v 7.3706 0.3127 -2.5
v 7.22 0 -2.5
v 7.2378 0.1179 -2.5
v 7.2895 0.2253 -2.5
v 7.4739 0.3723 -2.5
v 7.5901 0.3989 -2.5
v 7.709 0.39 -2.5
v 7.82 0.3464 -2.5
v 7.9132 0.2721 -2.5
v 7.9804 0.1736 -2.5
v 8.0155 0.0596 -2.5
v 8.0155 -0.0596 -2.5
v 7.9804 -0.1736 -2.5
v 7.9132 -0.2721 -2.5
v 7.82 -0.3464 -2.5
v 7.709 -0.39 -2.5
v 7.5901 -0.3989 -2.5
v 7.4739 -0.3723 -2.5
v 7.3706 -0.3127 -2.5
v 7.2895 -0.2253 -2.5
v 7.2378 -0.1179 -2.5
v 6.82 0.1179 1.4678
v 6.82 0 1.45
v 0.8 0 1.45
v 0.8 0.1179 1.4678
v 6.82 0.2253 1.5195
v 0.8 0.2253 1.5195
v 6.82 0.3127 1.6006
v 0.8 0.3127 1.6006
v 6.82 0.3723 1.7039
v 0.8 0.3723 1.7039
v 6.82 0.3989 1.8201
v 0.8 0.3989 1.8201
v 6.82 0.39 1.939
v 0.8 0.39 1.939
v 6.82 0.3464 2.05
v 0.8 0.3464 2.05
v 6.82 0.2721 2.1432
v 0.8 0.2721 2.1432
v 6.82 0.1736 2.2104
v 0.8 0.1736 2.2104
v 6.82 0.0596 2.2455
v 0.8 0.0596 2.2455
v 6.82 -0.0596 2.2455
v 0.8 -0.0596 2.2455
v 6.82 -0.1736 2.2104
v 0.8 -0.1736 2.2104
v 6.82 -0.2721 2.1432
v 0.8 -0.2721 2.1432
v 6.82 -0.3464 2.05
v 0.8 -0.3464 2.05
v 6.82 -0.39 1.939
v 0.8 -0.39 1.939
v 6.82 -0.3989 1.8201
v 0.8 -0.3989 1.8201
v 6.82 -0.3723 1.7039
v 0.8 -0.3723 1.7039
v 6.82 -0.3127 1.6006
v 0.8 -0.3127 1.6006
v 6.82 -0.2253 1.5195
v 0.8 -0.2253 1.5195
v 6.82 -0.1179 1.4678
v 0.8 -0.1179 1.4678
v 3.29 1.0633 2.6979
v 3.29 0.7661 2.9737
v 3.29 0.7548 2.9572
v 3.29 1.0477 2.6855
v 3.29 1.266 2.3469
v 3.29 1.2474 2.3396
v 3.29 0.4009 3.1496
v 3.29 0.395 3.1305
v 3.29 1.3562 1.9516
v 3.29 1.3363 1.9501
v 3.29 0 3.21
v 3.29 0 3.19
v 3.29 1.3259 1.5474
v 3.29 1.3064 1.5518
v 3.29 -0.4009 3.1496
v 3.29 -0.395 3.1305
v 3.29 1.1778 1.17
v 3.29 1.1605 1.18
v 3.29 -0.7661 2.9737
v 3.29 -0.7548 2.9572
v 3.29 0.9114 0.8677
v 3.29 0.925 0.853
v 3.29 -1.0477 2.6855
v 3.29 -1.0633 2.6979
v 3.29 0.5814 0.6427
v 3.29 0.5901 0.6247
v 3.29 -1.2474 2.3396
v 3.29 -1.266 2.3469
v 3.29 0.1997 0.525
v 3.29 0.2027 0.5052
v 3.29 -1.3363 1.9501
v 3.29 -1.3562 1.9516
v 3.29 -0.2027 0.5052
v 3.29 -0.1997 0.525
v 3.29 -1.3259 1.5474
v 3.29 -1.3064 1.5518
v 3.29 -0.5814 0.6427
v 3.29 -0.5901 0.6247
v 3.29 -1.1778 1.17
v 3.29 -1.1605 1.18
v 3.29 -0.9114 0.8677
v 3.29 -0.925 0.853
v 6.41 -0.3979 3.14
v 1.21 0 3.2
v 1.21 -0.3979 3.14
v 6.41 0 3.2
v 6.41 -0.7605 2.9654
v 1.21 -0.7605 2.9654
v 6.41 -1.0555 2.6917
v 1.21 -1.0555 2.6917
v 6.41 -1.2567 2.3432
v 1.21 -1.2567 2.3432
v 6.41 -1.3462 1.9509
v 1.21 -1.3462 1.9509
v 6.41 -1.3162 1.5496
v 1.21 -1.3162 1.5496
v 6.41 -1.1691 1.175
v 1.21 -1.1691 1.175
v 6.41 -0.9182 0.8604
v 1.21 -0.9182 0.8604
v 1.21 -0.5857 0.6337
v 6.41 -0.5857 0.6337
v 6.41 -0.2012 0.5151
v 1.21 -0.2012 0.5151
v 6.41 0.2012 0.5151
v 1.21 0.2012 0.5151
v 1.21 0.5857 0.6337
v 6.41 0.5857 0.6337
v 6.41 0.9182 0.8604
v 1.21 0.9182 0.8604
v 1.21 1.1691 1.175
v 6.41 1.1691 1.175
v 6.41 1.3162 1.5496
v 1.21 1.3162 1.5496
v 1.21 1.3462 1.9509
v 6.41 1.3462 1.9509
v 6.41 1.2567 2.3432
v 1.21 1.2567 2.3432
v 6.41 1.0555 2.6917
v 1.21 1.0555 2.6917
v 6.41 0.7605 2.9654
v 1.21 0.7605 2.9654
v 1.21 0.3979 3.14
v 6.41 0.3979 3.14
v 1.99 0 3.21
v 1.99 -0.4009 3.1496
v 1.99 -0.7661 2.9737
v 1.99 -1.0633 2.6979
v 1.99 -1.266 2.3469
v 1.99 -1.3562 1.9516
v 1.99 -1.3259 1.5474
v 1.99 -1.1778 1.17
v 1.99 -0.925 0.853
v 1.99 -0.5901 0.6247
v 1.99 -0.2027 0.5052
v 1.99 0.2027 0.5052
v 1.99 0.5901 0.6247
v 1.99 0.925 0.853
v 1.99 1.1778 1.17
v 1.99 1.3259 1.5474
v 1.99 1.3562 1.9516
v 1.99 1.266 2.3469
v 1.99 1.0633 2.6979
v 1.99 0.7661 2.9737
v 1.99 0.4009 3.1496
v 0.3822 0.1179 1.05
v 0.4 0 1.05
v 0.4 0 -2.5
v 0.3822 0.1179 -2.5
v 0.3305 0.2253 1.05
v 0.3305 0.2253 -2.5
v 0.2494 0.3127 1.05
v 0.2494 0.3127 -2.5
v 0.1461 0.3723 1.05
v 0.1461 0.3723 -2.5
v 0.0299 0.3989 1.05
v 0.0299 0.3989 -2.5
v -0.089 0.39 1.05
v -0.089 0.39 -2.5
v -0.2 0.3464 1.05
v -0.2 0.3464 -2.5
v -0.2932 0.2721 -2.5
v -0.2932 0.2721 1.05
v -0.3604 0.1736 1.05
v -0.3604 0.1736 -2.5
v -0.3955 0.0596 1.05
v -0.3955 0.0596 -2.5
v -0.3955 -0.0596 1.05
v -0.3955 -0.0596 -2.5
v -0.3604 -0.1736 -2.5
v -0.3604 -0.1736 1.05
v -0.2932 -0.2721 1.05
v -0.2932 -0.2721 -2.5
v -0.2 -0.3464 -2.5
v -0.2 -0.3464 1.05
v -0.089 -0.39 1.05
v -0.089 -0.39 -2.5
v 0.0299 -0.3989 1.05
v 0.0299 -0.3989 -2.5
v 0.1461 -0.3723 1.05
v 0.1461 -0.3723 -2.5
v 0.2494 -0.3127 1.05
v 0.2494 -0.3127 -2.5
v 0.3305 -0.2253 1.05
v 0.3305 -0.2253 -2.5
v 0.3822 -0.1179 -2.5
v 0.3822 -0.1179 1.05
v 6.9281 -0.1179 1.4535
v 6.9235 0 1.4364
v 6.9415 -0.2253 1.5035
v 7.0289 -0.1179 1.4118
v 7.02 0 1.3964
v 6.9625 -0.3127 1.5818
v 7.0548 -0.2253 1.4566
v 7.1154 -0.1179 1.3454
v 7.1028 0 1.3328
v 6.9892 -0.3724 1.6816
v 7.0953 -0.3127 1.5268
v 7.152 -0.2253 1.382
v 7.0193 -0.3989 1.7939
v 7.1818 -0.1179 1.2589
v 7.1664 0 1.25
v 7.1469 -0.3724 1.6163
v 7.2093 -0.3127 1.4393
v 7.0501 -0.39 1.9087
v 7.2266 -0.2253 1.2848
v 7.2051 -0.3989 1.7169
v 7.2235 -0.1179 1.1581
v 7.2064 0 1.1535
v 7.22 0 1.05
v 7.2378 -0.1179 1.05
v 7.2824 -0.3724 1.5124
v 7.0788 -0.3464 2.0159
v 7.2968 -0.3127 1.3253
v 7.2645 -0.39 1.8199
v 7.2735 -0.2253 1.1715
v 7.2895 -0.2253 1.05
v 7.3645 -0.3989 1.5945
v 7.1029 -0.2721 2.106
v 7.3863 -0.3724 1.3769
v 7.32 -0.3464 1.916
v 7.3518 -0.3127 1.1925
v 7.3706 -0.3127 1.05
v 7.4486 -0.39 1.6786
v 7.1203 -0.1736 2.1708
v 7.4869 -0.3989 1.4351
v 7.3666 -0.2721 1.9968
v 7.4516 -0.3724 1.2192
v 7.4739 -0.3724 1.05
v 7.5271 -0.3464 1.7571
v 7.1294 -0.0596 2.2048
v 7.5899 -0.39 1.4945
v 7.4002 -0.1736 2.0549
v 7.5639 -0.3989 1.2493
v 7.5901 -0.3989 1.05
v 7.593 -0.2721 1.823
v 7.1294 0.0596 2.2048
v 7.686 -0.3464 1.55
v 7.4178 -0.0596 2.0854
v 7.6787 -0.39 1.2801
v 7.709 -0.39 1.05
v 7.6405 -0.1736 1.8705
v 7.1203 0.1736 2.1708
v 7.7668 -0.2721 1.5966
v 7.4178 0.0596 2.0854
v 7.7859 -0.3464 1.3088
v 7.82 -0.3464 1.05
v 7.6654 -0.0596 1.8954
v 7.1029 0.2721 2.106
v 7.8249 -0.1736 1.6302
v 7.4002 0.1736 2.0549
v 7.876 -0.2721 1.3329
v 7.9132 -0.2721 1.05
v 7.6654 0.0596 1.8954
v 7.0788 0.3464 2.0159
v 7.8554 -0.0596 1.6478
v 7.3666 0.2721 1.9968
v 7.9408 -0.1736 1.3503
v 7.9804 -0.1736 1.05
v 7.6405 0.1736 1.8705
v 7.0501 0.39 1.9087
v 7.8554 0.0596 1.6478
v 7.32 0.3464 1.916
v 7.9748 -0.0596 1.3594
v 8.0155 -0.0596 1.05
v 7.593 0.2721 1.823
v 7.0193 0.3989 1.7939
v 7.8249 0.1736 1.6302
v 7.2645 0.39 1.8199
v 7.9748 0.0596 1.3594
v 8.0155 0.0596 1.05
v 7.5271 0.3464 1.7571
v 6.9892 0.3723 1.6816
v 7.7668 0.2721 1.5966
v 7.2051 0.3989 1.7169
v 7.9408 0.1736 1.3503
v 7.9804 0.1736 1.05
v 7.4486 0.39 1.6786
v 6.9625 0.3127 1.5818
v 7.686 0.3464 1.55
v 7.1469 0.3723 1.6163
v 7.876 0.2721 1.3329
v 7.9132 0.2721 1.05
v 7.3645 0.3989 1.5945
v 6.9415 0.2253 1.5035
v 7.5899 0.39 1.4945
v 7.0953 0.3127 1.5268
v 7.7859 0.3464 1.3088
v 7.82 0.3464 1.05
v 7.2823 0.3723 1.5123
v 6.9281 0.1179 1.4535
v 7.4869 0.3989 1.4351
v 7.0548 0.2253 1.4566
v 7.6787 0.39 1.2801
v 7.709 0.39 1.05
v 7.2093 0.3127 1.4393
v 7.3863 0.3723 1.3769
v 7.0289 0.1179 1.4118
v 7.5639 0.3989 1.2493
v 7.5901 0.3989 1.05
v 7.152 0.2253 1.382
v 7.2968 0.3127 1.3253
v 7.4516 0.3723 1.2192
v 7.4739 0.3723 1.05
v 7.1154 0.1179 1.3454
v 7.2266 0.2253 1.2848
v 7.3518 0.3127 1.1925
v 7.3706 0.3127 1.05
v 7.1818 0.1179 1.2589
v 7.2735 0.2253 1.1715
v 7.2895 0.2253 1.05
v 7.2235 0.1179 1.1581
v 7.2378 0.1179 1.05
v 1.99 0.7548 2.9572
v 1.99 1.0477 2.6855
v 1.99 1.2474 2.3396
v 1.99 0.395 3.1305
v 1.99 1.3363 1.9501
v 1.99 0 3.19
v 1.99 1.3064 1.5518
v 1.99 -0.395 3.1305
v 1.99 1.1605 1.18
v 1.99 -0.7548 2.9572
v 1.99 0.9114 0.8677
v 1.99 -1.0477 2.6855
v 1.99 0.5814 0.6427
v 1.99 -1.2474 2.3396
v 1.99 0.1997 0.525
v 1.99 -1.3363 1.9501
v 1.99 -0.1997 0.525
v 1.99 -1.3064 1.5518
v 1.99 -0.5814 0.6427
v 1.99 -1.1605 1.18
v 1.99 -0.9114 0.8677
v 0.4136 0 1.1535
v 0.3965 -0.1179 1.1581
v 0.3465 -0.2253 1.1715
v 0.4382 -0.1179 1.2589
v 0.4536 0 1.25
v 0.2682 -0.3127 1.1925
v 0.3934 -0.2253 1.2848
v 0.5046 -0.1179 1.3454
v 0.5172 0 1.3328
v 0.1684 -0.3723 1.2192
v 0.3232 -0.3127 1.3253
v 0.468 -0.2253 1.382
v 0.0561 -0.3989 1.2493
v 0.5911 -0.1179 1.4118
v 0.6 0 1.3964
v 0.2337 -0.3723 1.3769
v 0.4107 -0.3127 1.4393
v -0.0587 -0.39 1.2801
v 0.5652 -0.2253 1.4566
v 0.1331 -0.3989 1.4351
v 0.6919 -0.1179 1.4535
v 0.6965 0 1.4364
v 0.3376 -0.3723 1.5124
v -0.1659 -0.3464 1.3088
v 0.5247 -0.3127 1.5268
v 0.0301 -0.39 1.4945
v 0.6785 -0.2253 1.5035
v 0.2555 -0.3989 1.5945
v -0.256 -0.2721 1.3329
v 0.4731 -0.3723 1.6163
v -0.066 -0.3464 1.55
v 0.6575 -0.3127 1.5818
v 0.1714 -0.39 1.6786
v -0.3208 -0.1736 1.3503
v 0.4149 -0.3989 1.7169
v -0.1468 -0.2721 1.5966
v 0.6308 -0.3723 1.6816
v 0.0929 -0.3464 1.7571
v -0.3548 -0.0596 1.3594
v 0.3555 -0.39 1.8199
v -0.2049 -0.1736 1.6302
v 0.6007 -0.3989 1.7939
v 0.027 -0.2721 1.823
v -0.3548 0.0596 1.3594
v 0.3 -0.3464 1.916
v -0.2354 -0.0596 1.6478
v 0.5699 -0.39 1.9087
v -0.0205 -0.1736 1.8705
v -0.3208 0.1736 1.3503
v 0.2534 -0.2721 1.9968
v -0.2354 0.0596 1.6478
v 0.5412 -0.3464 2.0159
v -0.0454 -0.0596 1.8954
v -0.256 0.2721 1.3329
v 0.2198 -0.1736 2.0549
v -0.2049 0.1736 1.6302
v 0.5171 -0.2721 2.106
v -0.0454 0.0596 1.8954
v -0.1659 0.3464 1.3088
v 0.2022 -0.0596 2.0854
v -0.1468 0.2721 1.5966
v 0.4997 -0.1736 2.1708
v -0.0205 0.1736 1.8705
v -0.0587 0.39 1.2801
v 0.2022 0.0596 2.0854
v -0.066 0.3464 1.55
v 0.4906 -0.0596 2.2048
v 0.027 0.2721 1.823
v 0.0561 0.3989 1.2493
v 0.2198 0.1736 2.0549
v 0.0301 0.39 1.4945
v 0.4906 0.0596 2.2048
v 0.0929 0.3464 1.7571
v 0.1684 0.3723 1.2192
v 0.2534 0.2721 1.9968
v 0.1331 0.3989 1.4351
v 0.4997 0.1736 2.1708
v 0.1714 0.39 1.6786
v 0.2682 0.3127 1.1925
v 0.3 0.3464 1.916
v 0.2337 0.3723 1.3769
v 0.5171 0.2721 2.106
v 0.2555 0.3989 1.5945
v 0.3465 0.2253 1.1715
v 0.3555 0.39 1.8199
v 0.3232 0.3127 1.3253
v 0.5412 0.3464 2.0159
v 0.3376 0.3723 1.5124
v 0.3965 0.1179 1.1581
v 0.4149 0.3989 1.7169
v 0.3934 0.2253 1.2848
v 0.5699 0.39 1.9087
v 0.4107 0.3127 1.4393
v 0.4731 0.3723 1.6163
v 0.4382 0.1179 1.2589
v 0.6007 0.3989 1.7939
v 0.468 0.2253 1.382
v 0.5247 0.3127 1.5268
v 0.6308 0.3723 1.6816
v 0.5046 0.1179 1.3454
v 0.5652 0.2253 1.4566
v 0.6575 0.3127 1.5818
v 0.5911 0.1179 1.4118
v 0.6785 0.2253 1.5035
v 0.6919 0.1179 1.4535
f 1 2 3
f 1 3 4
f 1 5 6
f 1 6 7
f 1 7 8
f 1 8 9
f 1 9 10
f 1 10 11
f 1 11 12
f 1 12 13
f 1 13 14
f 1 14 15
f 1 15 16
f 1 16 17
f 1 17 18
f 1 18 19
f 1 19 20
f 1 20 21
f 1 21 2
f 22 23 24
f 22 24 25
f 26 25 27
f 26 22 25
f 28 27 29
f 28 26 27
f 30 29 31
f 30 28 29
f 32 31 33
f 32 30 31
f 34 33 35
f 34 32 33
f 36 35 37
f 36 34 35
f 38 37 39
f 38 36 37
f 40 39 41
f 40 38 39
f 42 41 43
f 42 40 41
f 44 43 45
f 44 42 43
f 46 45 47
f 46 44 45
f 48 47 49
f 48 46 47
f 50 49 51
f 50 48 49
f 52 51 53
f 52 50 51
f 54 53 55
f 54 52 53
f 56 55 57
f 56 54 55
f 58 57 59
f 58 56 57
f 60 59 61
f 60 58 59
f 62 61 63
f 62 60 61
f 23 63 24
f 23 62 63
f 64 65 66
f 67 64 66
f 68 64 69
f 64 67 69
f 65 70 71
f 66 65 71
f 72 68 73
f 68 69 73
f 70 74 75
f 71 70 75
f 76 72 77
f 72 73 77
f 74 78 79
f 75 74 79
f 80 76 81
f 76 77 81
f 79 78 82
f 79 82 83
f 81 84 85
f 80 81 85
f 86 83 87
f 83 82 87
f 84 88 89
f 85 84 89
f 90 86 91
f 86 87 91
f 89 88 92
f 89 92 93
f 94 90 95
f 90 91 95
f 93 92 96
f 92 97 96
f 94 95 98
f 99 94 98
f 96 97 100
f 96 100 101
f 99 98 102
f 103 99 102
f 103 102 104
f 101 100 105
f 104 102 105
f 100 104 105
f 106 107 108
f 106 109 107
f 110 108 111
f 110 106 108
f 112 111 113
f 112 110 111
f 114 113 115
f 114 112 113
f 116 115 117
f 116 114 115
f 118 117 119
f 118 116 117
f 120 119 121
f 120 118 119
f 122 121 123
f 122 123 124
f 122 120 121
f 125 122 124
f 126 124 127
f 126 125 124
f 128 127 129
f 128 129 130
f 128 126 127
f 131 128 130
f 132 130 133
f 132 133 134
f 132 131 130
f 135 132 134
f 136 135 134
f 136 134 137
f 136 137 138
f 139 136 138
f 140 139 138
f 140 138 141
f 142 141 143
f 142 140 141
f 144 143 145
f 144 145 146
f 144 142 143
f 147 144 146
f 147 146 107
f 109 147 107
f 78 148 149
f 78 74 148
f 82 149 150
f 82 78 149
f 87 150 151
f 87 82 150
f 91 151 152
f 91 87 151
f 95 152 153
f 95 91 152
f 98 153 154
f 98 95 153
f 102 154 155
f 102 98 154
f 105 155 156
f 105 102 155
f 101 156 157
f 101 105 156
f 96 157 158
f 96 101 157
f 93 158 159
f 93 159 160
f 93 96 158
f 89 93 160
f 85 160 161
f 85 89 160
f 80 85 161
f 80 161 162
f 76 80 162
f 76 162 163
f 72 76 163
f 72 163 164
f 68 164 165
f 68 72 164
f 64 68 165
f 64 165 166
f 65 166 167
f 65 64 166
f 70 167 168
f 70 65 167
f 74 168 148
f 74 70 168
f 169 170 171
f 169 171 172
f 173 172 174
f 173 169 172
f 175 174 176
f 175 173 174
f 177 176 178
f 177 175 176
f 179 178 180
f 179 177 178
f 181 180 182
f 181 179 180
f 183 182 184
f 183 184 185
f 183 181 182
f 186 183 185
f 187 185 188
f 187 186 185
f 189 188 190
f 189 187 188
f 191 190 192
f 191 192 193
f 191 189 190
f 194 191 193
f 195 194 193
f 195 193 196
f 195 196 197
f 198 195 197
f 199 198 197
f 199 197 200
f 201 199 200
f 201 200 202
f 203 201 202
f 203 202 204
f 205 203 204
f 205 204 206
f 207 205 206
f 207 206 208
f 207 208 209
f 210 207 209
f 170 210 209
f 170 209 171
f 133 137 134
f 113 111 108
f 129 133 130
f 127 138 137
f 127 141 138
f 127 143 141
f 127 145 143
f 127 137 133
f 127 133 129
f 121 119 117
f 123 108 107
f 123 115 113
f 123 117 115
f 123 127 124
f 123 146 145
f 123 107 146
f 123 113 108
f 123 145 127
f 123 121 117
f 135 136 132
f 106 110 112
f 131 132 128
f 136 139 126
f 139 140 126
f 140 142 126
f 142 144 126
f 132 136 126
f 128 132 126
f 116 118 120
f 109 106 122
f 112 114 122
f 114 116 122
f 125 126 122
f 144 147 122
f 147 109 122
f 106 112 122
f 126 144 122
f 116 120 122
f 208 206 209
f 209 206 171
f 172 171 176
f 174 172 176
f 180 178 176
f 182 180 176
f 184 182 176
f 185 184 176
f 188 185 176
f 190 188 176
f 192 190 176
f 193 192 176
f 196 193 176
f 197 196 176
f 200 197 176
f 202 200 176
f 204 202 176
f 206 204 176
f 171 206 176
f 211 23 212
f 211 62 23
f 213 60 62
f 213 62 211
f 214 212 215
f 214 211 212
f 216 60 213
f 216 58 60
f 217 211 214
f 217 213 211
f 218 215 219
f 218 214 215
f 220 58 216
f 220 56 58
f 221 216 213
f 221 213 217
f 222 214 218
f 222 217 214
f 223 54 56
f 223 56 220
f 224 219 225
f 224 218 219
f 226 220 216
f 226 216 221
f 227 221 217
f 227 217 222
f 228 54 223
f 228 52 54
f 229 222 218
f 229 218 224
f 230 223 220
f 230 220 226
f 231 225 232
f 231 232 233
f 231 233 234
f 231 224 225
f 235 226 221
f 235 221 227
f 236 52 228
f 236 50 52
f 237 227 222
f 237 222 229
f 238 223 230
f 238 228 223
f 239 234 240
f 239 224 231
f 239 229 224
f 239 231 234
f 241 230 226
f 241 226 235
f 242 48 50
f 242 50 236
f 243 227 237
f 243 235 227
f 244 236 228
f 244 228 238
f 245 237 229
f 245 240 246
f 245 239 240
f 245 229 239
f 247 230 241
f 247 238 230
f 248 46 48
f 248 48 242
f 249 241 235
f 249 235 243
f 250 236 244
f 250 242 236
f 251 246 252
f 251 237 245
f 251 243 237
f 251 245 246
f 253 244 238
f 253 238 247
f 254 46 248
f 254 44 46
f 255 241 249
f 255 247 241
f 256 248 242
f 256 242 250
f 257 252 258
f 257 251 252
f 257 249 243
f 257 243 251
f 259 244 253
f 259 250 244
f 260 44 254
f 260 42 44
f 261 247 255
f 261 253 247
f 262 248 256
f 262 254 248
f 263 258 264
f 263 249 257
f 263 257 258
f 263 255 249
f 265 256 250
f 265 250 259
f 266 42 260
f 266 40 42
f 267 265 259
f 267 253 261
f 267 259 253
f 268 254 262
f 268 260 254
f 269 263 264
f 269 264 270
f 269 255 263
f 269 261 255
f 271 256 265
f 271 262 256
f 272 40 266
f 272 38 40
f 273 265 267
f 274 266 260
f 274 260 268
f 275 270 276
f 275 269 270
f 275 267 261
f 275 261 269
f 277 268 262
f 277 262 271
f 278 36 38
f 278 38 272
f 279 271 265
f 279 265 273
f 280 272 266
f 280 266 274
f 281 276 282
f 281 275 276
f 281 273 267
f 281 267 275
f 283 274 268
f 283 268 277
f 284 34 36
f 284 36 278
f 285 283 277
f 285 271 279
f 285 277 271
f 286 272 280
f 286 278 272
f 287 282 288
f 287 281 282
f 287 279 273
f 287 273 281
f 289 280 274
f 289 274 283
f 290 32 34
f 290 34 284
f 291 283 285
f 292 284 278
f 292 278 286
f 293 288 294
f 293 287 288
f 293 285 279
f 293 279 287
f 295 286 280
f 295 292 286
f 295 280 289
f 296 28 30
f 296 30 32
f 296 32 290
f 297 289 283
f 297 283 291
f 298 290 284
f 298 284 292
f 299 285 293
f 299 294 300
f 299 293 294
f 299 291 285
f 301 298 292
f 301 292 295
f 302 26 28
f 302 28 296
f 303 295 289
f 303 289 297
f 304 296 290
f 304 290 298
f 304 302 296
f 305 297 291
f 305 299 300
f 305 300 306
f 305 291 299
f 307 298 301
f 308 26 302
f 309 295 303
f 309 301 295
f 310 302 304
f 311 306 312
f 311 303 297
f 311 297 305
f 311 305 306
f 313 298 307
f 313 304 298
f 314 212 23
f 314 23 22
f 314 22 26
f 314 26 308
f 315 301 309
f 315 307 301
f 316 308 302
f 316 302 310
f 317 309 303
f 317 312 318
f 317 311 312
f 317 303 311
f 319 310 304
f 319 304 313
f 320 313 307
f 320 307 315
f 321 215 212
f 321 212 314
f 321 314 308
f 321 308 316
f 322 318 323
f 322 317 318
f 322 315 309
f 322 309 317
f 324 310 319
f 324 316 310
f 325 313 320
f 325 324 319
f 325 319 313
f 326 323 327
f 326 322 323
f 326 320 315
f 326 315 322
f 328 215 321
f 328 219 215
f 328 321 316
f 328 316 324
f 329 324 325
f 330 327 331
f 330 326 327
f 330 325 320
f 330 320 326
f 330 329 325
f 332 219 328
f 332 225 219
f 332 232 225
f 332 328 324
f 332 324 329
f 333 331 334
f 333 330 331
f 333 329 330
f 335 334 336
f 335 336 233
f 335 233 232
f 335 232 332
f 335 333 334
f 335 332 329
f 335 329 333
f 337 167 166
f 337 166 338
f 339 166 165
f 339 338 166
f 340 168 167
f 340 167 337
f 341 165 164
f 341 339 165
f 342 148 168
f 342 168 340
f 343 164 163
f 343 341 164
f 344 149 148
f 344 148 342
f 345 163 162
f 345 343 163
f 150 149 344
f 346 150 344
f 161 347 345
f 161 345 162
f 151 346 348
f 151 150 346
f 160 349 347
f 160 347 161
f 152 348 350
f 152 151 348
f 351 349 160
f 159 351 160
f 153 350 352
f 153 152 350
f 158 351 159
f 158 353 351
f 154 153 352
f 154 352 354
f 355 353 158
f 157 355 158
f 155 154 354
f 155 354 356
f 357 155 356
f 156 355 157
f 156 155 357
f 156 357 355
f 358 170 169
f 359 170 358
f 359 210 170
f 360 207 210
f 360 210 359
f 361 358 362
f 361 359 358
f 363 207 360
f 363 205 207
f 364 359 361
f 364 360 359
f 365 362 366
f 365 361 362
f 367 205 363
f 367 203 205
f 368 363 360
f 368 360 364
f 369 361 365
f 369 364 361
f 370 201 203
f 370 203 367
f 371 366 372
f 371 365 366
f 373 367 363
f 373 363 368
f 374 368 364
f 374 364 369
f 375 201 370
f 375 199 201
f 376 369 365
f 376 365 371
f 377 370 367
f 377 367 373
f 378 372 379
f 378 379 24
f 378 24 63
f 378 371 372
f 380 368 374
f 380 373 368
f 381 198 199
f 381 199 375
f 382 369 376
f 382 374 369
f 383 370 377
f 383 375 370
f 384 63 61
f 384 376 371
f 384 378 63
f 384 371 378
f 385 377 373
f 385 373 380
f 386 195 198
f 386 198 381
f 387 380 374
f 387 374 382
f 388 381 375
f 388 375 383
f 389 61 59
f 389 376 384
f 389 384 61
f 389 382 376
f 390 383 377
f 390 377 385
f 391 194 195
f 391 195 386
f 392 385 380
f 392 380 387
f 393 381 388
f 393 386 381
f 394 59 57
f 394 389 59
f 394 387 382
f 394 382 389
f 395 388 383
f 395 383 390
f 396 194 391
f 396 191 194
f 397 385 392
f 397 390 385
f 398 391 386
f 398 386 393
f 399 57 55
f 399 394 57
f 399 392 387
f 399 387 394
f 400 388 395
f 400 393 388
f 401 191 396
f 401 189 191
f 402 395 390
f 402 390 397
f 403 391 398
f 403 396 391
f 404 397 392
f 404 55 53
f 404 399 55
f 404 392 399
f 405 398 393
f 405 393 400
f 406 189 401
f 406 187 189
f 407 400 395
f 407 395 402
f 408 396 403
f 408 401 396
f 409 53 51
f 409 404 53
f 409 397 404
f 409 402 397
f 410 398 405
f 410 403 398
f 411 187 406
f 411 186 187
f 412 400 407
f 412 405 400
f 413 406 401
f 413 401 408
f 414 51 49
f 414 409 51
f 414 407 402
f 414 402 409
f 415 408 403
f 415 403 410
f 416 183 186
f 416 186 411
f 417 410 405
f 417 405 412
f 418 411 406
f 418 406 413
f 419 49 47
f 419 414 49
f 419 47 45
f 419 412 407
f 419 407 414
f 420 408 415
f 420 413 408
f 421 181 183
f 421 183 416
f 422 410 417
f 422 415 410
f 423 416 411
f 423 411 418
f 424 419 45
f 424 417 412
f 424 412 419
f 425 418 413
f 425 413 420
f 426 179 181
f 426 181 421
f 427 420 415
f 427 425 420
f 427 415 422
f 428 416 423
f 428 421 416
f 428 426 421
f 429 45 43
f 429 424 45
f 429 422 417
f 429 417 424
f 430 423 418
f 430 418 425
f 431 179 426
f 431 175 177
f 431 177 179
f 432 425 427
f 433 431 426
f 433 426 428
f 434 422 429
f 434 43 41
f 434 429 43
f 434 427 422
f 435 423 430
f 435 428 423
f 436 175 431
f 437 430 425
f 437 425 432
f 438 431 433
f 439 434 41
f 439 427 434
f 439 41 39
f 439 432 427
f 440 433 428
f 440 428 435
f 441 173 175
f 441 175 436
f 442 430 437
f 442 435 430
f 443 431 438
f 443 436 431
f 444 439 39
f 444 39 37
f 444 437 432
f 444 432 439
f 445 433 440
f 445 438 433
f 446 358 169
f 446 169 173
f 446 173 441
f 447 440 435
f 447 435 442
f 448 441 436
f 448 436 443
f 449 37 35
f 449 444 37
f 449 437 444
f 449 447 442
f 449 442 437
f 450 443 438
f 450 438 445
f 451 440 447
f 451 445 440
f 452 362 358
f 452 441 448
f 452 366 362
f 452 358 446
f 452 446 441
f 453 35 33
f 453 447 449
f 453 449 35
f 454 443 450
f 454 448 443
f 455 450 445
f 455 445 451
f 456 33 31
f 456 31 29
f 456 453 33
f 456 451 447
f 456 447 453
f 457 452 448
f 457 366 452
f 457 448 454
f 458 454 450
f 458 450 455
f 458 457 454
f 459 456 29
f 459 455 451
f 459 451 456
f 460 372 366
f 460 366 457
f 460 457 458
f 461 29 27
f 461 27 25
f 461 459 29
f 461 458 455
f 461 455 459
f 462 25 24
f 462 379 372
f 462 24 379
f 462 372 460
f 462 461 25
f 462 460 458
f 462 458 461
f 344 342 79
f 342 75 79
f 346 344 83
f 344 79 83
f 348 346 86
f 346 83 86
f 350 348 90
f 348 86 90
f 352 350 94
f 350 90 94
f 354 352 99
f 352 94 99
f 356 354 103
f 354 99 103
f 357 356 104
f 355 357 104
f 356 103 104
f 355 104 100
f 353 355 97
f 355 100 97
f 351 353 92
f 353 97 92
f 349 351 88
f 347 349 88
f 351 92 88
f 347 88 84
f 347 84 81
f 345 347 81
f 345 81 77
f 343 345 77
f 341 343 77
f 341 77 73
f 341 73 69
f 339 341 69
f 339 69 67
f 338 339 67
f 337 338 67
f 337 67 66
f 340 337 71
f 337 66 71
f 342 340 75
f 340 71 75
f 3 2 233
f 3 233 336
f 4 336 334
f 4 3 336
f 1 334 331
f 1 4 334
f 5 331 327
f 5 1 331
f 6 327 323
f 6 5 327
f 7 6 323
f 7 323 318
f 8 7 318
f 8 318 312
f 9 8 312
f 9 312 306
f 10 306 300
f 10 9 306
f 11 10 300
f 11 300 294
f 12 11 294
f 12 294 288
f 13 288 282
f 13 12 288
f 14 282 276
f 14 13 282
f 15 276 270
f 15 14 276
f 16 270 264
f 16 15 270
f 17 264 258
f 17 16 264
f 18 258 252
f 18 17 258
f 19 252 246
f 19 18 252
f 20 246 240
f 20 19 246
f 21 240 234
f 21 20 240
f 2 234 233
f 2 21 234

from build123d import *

# Parameters (mm, degrees)
SKETCH002_W = 5.2
SKETCH002_H = 1.35
SKETCH003_W = 1.3
SKETCH003_H = 0.02
SKETCH_R    = 0.4


with BuildPart() as revolution:
    # Sketch002 → Revolution (revolve)
    with BuildSketch(Plane.XZ):
        with Locations((3.81, 2.525)):
            Rectangle(SKETCH002_W, SKETCH002_H)
    revolve(axis=Axis((1.21, 0, 1.85), (1, 0, 0)))


with BuildPart() as revolution001:
    # Sketch003 → Revolution001 (revolve)
    with BuildSketch(Plane.XZ):
        with Locations((2.64, 3.2)):
            Rectangle(SKETCH003_W, SKETCH003_H)
    revolve(axis=Axis((0, 0, 1.85), (1, 0, 0)))


with BuildPart() as sweep_body:
    # Sweep: sweep along a path in Sketch001
    with BuildLine(Plane.XZ) as sweep_path:
        Line((0, -2.5), (0, 1.05))
        ThreePointArc((0, 1.05), (0.234315, 1.615685), (0.8, 1.85))
        Line((0.8, 1.85), (6.82, 1.85))
        ThreePointArc((6.82, 1.85), (7.385685, 1.615685), (7.62, 1.05))
        Line((7.62, 1.05), (7.62, -2.5))
    # Sketch → Sweep (sweep)
    with BuildSketch(Plane.XY.offset(-2)):
        Circle(SKETCH_R)
    sweep(path=sweep_path.line)


solid = Compound([revolution.part, revolution001.part, sweep_body.part])
